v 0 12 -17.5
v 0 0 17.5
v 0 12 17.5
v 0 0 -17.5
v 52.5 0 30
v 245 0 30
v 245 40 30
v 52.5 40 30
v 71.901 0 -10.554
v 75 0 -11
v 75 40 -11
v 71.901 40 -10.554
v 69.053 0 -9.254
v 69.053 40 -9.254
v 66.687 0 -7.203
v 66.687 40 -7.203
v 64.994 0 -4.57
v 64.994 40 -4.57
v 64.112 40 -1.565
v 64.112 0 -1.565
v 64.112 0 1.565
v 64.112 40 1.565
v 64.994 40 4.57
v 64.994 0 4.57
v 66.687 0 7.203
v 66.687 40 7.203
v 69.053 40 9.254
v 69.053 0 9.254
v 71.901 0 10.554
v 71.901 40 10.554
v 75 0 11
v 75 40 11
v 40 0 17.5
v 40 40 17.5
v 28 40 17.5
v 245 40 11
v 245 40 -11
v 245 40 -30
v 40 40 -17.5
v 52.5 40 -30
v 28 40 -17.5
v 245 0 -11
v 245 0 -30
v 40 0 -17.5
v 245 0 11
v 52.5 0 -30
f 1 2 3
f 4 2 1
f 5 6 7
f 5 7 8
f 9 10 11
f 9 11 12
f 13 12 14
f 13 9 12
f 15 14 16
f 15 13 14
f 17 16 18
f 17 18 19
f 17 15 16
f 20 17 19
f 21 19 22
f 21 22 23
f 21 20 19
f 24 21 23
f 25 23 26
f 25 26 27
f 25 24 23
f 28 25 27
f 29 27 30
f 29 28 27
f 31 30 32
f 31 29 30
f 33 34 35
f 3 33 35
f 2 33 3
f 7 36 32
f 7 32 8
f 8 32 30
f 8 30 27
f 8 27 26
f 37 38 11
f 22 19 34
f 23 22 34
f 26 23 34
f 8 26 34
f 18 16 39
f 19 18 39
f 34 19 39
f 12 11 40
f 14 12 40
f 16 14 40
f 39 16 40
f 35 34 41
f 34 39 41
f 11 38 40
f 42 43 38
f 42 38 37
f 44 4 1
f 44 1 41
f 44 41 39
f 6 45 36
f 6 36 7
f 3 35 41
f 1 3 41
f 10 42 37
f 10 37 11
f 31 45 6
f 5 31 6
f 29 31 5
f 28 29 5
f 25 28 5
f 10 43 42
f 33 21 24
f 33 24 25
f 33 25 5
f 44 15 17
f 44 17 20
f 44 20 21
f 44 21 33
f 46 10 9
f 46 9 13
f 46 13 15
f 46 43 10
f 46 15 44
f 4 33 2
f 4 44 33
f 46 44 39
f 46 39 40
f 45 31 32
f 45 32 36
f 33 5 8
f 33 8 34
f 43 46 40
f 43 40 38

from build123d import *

# Parameters (mm, degrees)
BOSS_EXTRUDE1_DEPTH = 40
CHAMFER1_SIZE       = 28


with BuildPart() as part:
    # Sketch1 → Boss-Extrude1 (new body)
    with BuildSketch(Plane(origin=(0, 0, 0), x_dir=(1, 0, 0), z_dir=(0, 1, 0))):
        with BuildLine():
            Line((0, 0), (0, 17.5))
            Line((0, 17.5), (40, 17.5))
            Line((40, 17.5), (52.5, 30))
            Line((52.5, 30), (245, 30))
            Line((245, 30), (245, 11))
            Line((245, 11), (75, 11))
            ThreePointArc((75, 11), (64, 0), (75, -11))
            Line((75, -11), (245, -11))
            Line((245, -11), (245, -30))
            Line((245, -30), (52.5, -30))
            Line((52.5, -30), (40, -17.5))
            Line((40, -17.5), (0, -17.5))
            Line((0, -17.5), (0, 0))
        make_face()
    extrude(amount=BOSS_EXTRUDE1_DEPTH)

    # Chamfer1
    chamfer1_edges = [part.edges().sort_by_distance(p)[0] for p in [
        (0, 40, 0),
    ]]
    chamfer(chamfer1_edges, length=CHAMFER1_SIZE)


solid = part.part
